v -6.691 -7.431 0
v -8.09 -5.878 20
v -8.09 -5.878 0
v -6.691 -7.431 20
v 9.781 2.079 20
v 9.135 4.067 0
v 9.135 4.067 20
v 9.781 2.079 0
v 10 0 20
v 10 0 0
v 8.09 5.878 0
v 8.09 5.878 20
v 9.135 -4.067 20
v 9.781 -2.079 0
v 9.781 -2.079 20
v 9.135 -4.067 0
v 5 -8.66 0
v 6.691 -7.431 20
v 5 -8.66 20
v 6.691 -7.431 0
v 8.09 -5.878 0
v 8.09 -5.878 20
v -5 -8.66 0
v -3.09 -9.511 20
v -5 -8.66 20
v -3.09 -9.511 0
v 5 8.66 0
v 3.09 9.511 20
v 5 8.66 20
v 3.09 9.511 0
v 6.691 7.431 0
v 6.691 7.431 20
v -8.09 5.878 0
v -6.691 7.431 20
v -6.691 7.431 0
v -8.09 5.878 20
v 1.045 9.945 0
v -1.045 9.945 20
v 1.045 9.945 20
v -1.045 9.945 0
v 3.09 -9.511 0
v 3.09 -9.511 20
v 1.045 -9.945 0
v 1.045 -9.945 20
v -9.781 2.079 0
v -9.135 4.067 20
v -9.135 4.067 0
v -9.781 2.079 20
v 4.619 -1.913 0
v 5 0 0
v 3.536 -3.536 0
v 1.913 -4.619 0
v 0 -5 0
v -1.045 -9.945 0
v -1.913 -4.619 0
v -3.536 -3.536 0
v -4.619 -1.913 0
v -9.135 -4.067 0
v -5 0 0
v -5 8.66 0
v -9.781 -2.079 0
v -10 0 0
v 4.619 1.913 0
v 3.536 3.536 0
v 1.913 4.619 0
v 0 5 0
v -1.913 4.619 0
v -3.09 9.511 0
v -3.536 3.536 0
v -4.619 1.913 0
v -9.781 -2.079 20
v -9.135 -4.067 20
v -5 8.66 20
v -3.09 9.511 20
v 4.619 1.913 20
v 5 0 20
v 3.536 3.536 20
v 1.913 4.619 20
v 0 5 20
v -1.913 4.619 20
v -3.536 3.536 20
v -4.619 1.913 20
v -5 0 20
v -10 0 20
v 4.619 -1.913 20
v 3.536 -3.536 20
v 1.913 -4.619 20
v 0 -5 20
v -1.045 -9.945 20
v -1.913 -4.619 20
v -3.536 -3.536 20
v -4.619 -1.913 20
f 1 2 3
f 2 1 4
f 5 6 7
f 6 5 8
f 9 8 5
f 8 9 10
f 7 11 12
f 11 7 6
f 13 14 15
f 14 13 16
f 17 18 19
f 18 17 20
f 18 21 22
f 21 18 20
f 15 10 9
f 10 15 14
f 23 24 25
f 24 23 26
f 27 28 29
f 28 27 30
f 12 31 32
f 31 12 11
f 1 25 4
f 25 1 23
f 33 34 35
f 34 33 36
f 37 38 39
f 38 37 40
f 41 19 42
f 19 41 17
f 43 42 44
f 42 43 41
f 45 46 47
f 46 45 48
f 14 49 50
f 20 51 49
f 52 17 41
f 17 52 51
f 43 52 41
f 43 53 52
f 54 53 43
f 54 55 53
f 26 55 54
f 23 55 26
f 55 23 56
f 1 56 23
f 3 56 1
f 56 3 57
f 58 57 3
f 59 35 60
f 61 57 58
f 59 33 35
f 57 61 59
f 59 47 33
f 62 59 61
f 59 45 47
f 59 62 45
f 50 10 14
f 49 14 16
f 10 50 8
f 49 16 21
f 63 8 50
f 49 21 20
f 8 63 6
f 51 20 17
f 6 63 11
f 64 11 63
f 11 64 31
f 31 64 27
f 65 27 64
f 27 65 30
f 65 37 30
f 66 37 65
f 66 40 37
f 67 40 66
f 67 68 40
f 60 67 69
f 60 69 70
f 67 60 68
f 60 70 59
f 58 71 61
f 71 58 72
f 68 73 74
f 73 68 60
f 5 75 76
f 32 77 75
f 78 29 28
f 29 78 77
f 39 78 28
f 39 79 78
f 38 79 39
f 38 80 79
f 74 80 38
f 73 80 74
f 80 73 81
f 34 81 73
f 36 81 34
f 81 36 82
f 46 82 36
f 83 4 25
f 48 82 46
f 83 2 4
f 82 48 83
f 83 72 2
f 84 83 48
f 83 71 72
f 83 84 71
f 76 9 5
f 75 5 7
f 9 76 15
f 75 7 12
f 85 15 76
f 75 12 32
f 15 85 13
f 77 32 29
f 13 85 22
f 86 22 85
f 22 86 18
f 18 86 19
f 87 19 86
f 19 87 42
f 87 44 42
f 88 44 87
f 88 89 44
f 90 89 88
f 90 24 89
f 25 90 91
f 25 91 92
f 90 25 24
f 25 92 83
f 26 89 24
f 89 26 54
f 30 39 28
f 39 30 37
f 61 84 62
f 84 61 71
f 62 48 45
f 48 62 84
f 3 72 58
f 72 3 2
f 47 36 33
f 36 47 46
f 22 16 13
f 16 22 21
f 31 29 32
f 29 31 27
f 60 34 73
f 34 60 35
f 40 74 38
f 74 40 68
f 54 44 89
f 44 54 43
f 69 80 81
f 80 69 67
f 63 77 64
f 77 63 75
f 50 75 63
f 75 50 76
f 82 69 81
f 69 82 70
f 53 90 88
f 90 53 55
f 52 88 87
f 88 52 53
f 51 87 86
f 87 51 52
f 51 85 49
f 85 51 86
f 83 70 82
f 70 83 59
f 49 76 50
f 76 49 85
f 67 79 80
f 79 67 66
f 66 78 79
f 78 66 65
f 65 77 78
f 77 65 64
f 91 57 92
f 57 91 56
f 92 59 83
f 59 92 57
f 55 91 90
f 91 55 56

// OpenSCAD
difference() {
    cylinder(h = 20, r = 10);
    cylinder(h = 20, r = 5);
}
